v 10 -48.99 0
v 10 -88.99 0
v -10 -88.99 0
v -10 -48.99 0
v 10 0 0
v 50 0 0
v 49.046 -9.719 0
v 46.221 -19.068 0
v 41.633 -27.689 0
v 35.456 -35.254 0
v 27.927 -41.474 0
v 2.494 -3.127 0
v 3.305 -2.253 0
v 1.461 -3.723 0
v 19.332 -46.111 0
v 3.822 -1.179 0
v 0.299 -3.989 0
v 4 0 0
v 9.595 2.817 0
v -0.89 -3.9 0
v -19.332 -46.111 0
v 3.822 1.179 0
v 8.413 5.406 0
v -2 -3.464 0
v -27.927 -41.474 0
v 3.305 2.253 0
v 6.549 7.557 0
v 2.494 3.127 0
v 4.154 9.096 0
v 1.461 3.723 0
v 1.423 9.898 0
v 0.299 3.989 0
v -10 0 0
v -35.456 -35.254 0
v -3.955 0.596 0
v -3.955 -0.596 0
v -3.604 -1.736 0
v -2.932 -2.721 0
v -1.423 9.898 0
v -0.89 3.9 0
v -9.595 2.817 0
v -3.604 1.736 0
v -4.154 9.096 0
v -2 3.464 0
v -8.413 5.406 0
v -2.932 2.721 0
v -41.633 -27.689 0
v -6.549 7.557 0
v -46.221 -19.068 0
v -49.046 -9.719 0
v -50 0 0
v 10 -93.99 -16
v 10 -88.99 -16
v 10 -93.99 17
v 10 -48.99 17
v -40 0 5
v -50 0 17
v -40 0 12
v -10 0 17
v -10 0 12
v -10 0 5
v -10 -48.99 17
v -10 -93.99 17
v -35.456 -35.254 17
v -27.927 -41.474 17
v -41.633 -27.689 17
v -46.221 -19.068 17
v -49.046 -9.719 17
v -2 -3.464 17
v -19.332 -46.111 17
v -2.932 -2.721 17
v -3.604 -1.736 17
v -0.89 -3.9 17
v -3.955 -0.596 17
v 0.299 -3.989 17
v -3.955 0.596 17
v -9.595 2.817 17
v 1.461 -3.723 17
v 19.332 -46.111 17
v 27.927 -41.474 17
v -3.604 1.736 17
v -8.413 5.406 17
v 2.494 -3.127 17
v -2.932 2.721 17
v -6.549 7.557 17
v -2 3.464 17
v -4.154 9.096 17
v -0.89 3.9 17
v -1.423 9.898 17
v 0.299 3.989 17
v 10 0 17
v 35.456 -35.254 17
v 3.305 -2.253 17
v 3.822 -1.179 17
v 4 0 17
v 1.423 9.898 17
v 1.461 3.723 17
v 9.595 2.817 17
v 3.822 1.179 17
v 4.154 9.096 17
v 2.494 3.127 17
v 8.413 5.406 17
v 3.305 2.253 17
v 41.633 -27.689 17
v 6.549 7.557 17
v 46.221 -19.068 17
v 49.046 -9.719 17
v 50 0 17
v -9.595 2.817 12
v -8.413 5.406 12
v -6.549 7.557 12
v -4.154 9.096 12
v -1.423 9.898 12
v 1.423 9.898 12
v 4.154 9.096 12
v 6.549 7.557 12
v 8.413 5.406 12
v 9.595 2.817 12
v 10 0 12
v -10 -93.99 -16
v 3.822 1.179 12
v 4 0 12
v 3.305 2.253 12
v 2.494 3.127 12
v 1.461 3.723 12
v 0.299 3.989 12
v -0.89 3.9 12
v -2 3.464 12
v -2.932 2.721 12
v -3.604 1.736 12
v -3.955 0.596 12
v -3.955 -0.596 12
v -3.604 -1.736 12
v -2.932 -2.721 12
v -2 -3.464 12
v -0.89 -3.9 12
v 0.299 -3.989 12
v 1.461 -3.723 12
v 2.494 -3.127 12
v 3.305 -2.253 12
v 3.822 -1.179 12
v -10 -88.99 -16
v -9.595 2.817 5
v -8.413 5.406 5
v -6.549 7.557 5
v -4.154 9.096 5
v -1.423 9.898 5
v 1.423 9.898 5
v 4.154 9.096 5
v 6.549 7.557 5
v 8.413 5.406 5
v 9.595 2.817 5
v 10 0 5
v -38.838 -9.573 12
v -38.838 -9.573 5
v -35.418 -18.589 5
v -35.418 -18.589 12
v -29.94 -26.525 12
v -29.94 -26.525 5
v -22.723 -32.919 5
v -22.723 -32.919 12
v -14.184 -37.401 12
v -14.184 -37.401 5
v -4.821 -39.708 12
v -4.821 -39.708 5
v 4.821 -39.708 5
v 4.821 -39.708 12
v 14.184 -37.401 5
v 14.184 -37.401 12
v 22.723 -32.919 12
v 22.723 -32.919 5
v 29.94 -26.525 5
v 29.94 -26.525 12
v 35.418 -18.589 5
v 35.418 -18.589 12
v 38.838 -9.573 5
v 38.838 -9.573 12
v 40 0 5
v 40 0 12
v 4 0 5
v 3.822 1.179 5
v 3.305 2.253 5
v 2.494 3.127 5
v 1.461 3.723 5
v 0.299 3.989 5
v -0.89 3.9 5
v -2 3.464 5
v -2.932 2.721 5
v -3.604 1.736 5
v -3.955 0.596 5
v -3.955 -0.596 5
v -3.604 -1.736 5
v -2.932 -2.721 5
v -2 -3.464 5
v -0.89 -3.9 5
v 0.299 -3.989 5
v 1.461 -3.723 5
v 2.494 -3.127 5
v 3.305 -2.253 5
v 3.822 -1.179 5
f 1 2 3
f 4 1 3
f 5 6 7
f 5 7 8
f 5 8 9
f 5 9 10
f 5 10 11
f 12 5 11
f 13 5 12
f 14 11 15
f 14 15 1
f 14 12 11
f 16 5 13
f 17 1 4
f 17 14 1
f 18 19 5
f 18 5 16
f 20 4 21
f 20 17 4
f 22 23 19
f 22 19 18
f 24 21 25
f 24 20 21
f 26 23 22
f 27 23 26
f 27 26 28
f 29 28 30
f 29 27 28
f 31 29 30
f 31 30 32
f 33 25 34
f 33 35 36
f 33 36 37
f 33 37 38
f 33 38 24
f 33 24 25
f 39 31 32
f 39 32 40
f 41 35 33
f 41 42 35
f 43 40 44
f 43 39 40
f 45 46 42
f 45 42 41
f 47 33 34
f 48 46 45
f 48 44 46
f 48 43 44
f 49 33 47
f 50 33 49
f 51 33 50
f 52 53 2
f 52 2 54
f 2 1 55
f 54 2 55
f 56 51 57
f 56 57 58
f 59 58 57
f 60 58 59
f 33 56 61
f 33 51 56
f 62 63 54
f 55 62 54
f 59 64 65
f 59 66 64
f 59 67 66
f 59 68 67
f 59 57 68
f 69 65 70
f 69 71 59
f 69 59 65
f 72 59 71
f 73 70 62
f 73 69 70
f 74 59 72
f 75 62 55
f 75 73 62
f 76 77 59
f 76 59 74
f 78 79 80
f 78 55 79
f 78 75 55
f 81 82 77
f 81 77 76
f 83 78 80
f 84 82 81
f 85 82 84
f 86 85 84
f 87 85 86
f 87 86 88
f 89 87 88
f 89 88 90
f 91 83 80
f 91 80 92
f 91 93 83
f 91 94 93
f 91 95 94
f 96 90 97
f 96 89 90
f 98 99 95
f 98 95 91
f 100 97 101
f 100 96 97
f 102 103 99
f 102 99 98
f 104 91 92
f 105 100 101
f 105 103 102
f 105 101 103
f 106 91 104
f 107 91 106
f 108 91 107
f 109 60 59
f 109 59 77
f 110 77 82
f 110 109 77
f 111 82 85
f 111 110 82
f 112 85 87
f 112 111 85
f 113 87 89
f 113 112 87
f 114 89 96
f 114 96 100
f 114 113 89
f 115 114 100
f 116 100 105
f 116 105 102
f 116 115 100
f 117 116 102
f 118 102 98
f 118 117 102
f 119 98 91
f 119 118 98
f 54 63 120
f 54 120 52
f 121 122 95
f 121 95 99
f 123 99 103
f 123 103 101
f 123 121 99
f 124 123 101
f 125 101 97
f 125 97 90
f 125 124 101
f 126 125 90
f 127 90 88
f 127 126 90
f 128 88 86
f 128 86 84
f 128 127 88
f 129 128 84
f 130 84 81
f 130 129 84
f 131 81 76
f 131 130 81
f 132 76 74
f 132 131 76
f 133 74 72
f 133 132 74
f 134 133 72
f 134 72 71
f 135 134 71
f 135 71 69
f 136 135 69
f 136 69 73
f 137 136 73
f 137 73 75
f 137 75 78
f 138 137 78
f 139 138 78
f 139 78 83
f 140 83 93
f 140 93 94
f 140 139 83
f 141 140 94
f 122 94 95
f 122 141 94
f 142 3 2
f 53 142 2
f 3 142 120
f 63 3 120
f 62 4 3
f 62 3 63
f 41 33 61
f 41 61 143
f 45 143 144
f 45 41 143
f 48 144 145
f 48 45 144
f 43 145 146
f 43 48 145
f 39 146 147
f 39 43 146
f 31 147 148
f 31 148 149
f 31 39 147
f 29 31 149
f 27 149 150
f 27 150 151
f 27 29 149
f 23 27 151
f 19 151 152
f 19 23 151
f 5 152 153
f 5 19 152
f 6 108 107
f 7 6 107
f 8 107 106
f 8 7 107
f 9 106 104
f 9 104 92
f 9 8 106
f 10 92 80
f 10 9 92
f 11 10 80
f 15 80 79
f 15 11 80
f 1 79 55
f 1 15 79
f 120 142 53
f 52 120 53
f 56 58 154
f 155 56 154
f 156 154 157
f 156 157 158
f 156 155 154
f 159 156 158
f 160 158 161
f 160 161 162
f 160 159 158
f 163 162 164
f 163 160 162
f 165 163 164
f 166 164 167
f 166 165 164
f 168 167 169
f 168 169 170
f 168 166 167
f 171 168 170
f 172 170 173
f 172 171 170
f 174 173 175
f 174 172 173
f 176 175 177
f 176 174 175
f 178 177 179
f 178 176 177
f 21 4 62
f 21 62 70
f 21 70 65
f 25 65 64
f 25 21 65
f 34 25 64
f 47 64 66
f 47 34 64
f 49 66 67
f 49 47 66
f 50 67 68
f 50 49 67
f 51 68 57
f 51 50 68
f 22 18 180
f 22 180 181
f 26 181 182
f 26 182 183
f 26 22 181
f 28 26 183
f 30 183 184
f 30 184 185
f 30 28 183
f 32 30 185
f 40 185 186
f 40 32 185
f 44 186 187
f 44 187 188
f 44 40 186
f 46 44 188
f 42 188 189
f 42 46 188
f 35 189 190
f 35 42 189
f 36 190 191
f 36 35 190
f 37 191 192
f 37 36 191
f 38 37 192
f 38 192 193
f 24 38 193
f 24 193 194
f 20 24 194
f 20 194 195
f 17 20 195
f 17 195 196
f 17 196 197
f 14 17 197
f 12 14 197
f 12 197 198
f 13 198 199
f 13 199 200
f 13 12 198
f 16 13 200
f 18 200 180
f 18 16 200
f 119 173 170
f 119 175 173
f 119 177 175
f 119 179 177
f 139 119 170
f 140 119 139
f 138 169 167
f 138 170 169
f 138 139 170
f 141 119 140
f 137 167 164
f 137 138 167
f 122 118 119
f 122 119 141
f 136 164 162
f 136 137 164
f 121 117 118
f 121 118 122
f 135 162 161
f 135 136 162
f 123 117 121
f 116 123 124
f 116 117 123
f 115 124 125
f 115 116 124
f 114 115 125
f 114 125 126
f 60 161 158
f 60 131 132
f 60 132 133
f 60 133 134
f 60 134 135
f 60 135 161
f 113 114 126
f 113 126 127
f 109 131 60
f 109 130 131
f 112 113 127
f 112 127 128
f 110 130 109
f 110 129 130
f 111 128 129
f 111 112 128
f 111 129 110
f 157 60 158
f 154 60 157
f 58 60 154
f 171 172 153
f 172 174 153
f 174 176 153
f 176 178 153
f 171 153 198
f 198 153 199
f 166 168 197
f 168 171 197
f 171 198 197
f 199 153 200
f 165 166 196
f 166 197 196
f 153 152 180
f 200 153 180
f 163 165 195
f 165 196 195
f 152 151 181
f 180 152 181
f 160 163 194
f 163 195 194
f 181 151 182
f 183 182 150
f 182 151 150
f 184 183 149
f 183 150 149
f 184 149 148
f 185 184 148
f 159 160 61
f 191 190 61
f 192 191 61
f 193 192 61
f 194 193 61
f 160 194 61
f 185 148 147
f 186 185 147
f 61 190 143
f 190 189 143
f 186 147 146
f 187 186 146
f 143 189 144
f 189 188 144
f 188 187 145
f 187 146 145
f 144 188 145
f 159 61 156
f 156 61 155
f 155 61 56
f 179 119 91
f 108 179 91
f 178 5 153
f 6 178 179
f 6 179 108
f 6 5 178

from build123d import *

# Parameters (mm, degrees)
SKETCH1_R           = 4
BOSS_EXTRUDE1_DEPTH = 5
BOSS_EXTRUDE2_DEPTH = 7
SKETCH3_R           = 4
BOSS_EXTRUDE3_DEPTH = 5
BOSS_EXTRUDE4_START = -17
BOSS_EXTRUDE4_DEPTH = 17
SKETCH5_W           = 20
SKETCH5_H           = 33
BOSS_EXTRUDE5_DEPTH = 5


with BuildPart() as part:
    # Sketch1 → Boss-Extrude1 (new body)
    with BuildSketch(Plane.XY):
        with BuildLine():
            Line((-50, 0), (-10, 0))
            ThreePointArc((-10, 0), (0, 10), (10, 0))
            Line((10, 0), (50, 0))
            ThreePointArc((50, 0), (0, -50), (-50, 0))
        make_face()
        Circle(SKETCH1_R, mode=Mode.SUBTRACT)
    extrude(amount=BOSS_EXTRUDE1_DEPTH)

    # Sketch2 → Boss-Extrude2 (add)
    with BuildSketch(Plane.XY.offset(5)):
        with BuildLine():
            Line((-50, 0), (-40, 0))
            ThreePointArc((-40, 0), (0, -40), (40, 0))
            Line((40, 0), (50, 0))
            ThreePointArc((50, 0), (0, -50), (-50, 0))
        make_face()
    extrude(amount=BOSS_EXTRUDE2_DEPTH)

    # Sketch3 → Boss-Extrude3 (add)
    with BuildSketch(Plane.XY.offset(12)):
        with BuildLine():
            Line((-50, 0), (-10, 0))
            ThreePointArc((-10, 0), (0, 10), (10, 0))
            Line((10, 0), (50, 0))
            ThreePointArc((50, 0), (0, -50), (-50, 0))
        make_face()
        Circle(SKETCH3_R, mode=Mode.SUBTRACT)
    extrude(amount=BOSS_EXTRUDE3_DEPTH)

    # Sketch4 → Boss-Extrude4 (add)
    with BuildSketch(Plane.XY.offset(17).offset(BOSS_EXTRUDE4_START)):
        with BuildLine():
            Line((-10, -88.989794856), (10, -88.989794856))
            Line((10, -88.989794856), (10, -48.989794856))
            ThreePointArc((10, -48.989794856), (0, -50), (-10, -48.989794856))
            Line((-10, -48.989794856), (-10, -88.989794856))
        make_face()
    extrude(amount=BOSS_EXTRUDE4_DEPTH)

    # Sketch5 → Boss-Extrude5 (add)
    with BuildSketch(Plane.XZ.offset(88.989794856)):
        with Locations((0, 0.5)):
            Rectangle(SKETCH5_W, SKETCH5_H)
    extrude(amount=BOSS_EXTRUDE5_DEPTH)


solid = part.part
